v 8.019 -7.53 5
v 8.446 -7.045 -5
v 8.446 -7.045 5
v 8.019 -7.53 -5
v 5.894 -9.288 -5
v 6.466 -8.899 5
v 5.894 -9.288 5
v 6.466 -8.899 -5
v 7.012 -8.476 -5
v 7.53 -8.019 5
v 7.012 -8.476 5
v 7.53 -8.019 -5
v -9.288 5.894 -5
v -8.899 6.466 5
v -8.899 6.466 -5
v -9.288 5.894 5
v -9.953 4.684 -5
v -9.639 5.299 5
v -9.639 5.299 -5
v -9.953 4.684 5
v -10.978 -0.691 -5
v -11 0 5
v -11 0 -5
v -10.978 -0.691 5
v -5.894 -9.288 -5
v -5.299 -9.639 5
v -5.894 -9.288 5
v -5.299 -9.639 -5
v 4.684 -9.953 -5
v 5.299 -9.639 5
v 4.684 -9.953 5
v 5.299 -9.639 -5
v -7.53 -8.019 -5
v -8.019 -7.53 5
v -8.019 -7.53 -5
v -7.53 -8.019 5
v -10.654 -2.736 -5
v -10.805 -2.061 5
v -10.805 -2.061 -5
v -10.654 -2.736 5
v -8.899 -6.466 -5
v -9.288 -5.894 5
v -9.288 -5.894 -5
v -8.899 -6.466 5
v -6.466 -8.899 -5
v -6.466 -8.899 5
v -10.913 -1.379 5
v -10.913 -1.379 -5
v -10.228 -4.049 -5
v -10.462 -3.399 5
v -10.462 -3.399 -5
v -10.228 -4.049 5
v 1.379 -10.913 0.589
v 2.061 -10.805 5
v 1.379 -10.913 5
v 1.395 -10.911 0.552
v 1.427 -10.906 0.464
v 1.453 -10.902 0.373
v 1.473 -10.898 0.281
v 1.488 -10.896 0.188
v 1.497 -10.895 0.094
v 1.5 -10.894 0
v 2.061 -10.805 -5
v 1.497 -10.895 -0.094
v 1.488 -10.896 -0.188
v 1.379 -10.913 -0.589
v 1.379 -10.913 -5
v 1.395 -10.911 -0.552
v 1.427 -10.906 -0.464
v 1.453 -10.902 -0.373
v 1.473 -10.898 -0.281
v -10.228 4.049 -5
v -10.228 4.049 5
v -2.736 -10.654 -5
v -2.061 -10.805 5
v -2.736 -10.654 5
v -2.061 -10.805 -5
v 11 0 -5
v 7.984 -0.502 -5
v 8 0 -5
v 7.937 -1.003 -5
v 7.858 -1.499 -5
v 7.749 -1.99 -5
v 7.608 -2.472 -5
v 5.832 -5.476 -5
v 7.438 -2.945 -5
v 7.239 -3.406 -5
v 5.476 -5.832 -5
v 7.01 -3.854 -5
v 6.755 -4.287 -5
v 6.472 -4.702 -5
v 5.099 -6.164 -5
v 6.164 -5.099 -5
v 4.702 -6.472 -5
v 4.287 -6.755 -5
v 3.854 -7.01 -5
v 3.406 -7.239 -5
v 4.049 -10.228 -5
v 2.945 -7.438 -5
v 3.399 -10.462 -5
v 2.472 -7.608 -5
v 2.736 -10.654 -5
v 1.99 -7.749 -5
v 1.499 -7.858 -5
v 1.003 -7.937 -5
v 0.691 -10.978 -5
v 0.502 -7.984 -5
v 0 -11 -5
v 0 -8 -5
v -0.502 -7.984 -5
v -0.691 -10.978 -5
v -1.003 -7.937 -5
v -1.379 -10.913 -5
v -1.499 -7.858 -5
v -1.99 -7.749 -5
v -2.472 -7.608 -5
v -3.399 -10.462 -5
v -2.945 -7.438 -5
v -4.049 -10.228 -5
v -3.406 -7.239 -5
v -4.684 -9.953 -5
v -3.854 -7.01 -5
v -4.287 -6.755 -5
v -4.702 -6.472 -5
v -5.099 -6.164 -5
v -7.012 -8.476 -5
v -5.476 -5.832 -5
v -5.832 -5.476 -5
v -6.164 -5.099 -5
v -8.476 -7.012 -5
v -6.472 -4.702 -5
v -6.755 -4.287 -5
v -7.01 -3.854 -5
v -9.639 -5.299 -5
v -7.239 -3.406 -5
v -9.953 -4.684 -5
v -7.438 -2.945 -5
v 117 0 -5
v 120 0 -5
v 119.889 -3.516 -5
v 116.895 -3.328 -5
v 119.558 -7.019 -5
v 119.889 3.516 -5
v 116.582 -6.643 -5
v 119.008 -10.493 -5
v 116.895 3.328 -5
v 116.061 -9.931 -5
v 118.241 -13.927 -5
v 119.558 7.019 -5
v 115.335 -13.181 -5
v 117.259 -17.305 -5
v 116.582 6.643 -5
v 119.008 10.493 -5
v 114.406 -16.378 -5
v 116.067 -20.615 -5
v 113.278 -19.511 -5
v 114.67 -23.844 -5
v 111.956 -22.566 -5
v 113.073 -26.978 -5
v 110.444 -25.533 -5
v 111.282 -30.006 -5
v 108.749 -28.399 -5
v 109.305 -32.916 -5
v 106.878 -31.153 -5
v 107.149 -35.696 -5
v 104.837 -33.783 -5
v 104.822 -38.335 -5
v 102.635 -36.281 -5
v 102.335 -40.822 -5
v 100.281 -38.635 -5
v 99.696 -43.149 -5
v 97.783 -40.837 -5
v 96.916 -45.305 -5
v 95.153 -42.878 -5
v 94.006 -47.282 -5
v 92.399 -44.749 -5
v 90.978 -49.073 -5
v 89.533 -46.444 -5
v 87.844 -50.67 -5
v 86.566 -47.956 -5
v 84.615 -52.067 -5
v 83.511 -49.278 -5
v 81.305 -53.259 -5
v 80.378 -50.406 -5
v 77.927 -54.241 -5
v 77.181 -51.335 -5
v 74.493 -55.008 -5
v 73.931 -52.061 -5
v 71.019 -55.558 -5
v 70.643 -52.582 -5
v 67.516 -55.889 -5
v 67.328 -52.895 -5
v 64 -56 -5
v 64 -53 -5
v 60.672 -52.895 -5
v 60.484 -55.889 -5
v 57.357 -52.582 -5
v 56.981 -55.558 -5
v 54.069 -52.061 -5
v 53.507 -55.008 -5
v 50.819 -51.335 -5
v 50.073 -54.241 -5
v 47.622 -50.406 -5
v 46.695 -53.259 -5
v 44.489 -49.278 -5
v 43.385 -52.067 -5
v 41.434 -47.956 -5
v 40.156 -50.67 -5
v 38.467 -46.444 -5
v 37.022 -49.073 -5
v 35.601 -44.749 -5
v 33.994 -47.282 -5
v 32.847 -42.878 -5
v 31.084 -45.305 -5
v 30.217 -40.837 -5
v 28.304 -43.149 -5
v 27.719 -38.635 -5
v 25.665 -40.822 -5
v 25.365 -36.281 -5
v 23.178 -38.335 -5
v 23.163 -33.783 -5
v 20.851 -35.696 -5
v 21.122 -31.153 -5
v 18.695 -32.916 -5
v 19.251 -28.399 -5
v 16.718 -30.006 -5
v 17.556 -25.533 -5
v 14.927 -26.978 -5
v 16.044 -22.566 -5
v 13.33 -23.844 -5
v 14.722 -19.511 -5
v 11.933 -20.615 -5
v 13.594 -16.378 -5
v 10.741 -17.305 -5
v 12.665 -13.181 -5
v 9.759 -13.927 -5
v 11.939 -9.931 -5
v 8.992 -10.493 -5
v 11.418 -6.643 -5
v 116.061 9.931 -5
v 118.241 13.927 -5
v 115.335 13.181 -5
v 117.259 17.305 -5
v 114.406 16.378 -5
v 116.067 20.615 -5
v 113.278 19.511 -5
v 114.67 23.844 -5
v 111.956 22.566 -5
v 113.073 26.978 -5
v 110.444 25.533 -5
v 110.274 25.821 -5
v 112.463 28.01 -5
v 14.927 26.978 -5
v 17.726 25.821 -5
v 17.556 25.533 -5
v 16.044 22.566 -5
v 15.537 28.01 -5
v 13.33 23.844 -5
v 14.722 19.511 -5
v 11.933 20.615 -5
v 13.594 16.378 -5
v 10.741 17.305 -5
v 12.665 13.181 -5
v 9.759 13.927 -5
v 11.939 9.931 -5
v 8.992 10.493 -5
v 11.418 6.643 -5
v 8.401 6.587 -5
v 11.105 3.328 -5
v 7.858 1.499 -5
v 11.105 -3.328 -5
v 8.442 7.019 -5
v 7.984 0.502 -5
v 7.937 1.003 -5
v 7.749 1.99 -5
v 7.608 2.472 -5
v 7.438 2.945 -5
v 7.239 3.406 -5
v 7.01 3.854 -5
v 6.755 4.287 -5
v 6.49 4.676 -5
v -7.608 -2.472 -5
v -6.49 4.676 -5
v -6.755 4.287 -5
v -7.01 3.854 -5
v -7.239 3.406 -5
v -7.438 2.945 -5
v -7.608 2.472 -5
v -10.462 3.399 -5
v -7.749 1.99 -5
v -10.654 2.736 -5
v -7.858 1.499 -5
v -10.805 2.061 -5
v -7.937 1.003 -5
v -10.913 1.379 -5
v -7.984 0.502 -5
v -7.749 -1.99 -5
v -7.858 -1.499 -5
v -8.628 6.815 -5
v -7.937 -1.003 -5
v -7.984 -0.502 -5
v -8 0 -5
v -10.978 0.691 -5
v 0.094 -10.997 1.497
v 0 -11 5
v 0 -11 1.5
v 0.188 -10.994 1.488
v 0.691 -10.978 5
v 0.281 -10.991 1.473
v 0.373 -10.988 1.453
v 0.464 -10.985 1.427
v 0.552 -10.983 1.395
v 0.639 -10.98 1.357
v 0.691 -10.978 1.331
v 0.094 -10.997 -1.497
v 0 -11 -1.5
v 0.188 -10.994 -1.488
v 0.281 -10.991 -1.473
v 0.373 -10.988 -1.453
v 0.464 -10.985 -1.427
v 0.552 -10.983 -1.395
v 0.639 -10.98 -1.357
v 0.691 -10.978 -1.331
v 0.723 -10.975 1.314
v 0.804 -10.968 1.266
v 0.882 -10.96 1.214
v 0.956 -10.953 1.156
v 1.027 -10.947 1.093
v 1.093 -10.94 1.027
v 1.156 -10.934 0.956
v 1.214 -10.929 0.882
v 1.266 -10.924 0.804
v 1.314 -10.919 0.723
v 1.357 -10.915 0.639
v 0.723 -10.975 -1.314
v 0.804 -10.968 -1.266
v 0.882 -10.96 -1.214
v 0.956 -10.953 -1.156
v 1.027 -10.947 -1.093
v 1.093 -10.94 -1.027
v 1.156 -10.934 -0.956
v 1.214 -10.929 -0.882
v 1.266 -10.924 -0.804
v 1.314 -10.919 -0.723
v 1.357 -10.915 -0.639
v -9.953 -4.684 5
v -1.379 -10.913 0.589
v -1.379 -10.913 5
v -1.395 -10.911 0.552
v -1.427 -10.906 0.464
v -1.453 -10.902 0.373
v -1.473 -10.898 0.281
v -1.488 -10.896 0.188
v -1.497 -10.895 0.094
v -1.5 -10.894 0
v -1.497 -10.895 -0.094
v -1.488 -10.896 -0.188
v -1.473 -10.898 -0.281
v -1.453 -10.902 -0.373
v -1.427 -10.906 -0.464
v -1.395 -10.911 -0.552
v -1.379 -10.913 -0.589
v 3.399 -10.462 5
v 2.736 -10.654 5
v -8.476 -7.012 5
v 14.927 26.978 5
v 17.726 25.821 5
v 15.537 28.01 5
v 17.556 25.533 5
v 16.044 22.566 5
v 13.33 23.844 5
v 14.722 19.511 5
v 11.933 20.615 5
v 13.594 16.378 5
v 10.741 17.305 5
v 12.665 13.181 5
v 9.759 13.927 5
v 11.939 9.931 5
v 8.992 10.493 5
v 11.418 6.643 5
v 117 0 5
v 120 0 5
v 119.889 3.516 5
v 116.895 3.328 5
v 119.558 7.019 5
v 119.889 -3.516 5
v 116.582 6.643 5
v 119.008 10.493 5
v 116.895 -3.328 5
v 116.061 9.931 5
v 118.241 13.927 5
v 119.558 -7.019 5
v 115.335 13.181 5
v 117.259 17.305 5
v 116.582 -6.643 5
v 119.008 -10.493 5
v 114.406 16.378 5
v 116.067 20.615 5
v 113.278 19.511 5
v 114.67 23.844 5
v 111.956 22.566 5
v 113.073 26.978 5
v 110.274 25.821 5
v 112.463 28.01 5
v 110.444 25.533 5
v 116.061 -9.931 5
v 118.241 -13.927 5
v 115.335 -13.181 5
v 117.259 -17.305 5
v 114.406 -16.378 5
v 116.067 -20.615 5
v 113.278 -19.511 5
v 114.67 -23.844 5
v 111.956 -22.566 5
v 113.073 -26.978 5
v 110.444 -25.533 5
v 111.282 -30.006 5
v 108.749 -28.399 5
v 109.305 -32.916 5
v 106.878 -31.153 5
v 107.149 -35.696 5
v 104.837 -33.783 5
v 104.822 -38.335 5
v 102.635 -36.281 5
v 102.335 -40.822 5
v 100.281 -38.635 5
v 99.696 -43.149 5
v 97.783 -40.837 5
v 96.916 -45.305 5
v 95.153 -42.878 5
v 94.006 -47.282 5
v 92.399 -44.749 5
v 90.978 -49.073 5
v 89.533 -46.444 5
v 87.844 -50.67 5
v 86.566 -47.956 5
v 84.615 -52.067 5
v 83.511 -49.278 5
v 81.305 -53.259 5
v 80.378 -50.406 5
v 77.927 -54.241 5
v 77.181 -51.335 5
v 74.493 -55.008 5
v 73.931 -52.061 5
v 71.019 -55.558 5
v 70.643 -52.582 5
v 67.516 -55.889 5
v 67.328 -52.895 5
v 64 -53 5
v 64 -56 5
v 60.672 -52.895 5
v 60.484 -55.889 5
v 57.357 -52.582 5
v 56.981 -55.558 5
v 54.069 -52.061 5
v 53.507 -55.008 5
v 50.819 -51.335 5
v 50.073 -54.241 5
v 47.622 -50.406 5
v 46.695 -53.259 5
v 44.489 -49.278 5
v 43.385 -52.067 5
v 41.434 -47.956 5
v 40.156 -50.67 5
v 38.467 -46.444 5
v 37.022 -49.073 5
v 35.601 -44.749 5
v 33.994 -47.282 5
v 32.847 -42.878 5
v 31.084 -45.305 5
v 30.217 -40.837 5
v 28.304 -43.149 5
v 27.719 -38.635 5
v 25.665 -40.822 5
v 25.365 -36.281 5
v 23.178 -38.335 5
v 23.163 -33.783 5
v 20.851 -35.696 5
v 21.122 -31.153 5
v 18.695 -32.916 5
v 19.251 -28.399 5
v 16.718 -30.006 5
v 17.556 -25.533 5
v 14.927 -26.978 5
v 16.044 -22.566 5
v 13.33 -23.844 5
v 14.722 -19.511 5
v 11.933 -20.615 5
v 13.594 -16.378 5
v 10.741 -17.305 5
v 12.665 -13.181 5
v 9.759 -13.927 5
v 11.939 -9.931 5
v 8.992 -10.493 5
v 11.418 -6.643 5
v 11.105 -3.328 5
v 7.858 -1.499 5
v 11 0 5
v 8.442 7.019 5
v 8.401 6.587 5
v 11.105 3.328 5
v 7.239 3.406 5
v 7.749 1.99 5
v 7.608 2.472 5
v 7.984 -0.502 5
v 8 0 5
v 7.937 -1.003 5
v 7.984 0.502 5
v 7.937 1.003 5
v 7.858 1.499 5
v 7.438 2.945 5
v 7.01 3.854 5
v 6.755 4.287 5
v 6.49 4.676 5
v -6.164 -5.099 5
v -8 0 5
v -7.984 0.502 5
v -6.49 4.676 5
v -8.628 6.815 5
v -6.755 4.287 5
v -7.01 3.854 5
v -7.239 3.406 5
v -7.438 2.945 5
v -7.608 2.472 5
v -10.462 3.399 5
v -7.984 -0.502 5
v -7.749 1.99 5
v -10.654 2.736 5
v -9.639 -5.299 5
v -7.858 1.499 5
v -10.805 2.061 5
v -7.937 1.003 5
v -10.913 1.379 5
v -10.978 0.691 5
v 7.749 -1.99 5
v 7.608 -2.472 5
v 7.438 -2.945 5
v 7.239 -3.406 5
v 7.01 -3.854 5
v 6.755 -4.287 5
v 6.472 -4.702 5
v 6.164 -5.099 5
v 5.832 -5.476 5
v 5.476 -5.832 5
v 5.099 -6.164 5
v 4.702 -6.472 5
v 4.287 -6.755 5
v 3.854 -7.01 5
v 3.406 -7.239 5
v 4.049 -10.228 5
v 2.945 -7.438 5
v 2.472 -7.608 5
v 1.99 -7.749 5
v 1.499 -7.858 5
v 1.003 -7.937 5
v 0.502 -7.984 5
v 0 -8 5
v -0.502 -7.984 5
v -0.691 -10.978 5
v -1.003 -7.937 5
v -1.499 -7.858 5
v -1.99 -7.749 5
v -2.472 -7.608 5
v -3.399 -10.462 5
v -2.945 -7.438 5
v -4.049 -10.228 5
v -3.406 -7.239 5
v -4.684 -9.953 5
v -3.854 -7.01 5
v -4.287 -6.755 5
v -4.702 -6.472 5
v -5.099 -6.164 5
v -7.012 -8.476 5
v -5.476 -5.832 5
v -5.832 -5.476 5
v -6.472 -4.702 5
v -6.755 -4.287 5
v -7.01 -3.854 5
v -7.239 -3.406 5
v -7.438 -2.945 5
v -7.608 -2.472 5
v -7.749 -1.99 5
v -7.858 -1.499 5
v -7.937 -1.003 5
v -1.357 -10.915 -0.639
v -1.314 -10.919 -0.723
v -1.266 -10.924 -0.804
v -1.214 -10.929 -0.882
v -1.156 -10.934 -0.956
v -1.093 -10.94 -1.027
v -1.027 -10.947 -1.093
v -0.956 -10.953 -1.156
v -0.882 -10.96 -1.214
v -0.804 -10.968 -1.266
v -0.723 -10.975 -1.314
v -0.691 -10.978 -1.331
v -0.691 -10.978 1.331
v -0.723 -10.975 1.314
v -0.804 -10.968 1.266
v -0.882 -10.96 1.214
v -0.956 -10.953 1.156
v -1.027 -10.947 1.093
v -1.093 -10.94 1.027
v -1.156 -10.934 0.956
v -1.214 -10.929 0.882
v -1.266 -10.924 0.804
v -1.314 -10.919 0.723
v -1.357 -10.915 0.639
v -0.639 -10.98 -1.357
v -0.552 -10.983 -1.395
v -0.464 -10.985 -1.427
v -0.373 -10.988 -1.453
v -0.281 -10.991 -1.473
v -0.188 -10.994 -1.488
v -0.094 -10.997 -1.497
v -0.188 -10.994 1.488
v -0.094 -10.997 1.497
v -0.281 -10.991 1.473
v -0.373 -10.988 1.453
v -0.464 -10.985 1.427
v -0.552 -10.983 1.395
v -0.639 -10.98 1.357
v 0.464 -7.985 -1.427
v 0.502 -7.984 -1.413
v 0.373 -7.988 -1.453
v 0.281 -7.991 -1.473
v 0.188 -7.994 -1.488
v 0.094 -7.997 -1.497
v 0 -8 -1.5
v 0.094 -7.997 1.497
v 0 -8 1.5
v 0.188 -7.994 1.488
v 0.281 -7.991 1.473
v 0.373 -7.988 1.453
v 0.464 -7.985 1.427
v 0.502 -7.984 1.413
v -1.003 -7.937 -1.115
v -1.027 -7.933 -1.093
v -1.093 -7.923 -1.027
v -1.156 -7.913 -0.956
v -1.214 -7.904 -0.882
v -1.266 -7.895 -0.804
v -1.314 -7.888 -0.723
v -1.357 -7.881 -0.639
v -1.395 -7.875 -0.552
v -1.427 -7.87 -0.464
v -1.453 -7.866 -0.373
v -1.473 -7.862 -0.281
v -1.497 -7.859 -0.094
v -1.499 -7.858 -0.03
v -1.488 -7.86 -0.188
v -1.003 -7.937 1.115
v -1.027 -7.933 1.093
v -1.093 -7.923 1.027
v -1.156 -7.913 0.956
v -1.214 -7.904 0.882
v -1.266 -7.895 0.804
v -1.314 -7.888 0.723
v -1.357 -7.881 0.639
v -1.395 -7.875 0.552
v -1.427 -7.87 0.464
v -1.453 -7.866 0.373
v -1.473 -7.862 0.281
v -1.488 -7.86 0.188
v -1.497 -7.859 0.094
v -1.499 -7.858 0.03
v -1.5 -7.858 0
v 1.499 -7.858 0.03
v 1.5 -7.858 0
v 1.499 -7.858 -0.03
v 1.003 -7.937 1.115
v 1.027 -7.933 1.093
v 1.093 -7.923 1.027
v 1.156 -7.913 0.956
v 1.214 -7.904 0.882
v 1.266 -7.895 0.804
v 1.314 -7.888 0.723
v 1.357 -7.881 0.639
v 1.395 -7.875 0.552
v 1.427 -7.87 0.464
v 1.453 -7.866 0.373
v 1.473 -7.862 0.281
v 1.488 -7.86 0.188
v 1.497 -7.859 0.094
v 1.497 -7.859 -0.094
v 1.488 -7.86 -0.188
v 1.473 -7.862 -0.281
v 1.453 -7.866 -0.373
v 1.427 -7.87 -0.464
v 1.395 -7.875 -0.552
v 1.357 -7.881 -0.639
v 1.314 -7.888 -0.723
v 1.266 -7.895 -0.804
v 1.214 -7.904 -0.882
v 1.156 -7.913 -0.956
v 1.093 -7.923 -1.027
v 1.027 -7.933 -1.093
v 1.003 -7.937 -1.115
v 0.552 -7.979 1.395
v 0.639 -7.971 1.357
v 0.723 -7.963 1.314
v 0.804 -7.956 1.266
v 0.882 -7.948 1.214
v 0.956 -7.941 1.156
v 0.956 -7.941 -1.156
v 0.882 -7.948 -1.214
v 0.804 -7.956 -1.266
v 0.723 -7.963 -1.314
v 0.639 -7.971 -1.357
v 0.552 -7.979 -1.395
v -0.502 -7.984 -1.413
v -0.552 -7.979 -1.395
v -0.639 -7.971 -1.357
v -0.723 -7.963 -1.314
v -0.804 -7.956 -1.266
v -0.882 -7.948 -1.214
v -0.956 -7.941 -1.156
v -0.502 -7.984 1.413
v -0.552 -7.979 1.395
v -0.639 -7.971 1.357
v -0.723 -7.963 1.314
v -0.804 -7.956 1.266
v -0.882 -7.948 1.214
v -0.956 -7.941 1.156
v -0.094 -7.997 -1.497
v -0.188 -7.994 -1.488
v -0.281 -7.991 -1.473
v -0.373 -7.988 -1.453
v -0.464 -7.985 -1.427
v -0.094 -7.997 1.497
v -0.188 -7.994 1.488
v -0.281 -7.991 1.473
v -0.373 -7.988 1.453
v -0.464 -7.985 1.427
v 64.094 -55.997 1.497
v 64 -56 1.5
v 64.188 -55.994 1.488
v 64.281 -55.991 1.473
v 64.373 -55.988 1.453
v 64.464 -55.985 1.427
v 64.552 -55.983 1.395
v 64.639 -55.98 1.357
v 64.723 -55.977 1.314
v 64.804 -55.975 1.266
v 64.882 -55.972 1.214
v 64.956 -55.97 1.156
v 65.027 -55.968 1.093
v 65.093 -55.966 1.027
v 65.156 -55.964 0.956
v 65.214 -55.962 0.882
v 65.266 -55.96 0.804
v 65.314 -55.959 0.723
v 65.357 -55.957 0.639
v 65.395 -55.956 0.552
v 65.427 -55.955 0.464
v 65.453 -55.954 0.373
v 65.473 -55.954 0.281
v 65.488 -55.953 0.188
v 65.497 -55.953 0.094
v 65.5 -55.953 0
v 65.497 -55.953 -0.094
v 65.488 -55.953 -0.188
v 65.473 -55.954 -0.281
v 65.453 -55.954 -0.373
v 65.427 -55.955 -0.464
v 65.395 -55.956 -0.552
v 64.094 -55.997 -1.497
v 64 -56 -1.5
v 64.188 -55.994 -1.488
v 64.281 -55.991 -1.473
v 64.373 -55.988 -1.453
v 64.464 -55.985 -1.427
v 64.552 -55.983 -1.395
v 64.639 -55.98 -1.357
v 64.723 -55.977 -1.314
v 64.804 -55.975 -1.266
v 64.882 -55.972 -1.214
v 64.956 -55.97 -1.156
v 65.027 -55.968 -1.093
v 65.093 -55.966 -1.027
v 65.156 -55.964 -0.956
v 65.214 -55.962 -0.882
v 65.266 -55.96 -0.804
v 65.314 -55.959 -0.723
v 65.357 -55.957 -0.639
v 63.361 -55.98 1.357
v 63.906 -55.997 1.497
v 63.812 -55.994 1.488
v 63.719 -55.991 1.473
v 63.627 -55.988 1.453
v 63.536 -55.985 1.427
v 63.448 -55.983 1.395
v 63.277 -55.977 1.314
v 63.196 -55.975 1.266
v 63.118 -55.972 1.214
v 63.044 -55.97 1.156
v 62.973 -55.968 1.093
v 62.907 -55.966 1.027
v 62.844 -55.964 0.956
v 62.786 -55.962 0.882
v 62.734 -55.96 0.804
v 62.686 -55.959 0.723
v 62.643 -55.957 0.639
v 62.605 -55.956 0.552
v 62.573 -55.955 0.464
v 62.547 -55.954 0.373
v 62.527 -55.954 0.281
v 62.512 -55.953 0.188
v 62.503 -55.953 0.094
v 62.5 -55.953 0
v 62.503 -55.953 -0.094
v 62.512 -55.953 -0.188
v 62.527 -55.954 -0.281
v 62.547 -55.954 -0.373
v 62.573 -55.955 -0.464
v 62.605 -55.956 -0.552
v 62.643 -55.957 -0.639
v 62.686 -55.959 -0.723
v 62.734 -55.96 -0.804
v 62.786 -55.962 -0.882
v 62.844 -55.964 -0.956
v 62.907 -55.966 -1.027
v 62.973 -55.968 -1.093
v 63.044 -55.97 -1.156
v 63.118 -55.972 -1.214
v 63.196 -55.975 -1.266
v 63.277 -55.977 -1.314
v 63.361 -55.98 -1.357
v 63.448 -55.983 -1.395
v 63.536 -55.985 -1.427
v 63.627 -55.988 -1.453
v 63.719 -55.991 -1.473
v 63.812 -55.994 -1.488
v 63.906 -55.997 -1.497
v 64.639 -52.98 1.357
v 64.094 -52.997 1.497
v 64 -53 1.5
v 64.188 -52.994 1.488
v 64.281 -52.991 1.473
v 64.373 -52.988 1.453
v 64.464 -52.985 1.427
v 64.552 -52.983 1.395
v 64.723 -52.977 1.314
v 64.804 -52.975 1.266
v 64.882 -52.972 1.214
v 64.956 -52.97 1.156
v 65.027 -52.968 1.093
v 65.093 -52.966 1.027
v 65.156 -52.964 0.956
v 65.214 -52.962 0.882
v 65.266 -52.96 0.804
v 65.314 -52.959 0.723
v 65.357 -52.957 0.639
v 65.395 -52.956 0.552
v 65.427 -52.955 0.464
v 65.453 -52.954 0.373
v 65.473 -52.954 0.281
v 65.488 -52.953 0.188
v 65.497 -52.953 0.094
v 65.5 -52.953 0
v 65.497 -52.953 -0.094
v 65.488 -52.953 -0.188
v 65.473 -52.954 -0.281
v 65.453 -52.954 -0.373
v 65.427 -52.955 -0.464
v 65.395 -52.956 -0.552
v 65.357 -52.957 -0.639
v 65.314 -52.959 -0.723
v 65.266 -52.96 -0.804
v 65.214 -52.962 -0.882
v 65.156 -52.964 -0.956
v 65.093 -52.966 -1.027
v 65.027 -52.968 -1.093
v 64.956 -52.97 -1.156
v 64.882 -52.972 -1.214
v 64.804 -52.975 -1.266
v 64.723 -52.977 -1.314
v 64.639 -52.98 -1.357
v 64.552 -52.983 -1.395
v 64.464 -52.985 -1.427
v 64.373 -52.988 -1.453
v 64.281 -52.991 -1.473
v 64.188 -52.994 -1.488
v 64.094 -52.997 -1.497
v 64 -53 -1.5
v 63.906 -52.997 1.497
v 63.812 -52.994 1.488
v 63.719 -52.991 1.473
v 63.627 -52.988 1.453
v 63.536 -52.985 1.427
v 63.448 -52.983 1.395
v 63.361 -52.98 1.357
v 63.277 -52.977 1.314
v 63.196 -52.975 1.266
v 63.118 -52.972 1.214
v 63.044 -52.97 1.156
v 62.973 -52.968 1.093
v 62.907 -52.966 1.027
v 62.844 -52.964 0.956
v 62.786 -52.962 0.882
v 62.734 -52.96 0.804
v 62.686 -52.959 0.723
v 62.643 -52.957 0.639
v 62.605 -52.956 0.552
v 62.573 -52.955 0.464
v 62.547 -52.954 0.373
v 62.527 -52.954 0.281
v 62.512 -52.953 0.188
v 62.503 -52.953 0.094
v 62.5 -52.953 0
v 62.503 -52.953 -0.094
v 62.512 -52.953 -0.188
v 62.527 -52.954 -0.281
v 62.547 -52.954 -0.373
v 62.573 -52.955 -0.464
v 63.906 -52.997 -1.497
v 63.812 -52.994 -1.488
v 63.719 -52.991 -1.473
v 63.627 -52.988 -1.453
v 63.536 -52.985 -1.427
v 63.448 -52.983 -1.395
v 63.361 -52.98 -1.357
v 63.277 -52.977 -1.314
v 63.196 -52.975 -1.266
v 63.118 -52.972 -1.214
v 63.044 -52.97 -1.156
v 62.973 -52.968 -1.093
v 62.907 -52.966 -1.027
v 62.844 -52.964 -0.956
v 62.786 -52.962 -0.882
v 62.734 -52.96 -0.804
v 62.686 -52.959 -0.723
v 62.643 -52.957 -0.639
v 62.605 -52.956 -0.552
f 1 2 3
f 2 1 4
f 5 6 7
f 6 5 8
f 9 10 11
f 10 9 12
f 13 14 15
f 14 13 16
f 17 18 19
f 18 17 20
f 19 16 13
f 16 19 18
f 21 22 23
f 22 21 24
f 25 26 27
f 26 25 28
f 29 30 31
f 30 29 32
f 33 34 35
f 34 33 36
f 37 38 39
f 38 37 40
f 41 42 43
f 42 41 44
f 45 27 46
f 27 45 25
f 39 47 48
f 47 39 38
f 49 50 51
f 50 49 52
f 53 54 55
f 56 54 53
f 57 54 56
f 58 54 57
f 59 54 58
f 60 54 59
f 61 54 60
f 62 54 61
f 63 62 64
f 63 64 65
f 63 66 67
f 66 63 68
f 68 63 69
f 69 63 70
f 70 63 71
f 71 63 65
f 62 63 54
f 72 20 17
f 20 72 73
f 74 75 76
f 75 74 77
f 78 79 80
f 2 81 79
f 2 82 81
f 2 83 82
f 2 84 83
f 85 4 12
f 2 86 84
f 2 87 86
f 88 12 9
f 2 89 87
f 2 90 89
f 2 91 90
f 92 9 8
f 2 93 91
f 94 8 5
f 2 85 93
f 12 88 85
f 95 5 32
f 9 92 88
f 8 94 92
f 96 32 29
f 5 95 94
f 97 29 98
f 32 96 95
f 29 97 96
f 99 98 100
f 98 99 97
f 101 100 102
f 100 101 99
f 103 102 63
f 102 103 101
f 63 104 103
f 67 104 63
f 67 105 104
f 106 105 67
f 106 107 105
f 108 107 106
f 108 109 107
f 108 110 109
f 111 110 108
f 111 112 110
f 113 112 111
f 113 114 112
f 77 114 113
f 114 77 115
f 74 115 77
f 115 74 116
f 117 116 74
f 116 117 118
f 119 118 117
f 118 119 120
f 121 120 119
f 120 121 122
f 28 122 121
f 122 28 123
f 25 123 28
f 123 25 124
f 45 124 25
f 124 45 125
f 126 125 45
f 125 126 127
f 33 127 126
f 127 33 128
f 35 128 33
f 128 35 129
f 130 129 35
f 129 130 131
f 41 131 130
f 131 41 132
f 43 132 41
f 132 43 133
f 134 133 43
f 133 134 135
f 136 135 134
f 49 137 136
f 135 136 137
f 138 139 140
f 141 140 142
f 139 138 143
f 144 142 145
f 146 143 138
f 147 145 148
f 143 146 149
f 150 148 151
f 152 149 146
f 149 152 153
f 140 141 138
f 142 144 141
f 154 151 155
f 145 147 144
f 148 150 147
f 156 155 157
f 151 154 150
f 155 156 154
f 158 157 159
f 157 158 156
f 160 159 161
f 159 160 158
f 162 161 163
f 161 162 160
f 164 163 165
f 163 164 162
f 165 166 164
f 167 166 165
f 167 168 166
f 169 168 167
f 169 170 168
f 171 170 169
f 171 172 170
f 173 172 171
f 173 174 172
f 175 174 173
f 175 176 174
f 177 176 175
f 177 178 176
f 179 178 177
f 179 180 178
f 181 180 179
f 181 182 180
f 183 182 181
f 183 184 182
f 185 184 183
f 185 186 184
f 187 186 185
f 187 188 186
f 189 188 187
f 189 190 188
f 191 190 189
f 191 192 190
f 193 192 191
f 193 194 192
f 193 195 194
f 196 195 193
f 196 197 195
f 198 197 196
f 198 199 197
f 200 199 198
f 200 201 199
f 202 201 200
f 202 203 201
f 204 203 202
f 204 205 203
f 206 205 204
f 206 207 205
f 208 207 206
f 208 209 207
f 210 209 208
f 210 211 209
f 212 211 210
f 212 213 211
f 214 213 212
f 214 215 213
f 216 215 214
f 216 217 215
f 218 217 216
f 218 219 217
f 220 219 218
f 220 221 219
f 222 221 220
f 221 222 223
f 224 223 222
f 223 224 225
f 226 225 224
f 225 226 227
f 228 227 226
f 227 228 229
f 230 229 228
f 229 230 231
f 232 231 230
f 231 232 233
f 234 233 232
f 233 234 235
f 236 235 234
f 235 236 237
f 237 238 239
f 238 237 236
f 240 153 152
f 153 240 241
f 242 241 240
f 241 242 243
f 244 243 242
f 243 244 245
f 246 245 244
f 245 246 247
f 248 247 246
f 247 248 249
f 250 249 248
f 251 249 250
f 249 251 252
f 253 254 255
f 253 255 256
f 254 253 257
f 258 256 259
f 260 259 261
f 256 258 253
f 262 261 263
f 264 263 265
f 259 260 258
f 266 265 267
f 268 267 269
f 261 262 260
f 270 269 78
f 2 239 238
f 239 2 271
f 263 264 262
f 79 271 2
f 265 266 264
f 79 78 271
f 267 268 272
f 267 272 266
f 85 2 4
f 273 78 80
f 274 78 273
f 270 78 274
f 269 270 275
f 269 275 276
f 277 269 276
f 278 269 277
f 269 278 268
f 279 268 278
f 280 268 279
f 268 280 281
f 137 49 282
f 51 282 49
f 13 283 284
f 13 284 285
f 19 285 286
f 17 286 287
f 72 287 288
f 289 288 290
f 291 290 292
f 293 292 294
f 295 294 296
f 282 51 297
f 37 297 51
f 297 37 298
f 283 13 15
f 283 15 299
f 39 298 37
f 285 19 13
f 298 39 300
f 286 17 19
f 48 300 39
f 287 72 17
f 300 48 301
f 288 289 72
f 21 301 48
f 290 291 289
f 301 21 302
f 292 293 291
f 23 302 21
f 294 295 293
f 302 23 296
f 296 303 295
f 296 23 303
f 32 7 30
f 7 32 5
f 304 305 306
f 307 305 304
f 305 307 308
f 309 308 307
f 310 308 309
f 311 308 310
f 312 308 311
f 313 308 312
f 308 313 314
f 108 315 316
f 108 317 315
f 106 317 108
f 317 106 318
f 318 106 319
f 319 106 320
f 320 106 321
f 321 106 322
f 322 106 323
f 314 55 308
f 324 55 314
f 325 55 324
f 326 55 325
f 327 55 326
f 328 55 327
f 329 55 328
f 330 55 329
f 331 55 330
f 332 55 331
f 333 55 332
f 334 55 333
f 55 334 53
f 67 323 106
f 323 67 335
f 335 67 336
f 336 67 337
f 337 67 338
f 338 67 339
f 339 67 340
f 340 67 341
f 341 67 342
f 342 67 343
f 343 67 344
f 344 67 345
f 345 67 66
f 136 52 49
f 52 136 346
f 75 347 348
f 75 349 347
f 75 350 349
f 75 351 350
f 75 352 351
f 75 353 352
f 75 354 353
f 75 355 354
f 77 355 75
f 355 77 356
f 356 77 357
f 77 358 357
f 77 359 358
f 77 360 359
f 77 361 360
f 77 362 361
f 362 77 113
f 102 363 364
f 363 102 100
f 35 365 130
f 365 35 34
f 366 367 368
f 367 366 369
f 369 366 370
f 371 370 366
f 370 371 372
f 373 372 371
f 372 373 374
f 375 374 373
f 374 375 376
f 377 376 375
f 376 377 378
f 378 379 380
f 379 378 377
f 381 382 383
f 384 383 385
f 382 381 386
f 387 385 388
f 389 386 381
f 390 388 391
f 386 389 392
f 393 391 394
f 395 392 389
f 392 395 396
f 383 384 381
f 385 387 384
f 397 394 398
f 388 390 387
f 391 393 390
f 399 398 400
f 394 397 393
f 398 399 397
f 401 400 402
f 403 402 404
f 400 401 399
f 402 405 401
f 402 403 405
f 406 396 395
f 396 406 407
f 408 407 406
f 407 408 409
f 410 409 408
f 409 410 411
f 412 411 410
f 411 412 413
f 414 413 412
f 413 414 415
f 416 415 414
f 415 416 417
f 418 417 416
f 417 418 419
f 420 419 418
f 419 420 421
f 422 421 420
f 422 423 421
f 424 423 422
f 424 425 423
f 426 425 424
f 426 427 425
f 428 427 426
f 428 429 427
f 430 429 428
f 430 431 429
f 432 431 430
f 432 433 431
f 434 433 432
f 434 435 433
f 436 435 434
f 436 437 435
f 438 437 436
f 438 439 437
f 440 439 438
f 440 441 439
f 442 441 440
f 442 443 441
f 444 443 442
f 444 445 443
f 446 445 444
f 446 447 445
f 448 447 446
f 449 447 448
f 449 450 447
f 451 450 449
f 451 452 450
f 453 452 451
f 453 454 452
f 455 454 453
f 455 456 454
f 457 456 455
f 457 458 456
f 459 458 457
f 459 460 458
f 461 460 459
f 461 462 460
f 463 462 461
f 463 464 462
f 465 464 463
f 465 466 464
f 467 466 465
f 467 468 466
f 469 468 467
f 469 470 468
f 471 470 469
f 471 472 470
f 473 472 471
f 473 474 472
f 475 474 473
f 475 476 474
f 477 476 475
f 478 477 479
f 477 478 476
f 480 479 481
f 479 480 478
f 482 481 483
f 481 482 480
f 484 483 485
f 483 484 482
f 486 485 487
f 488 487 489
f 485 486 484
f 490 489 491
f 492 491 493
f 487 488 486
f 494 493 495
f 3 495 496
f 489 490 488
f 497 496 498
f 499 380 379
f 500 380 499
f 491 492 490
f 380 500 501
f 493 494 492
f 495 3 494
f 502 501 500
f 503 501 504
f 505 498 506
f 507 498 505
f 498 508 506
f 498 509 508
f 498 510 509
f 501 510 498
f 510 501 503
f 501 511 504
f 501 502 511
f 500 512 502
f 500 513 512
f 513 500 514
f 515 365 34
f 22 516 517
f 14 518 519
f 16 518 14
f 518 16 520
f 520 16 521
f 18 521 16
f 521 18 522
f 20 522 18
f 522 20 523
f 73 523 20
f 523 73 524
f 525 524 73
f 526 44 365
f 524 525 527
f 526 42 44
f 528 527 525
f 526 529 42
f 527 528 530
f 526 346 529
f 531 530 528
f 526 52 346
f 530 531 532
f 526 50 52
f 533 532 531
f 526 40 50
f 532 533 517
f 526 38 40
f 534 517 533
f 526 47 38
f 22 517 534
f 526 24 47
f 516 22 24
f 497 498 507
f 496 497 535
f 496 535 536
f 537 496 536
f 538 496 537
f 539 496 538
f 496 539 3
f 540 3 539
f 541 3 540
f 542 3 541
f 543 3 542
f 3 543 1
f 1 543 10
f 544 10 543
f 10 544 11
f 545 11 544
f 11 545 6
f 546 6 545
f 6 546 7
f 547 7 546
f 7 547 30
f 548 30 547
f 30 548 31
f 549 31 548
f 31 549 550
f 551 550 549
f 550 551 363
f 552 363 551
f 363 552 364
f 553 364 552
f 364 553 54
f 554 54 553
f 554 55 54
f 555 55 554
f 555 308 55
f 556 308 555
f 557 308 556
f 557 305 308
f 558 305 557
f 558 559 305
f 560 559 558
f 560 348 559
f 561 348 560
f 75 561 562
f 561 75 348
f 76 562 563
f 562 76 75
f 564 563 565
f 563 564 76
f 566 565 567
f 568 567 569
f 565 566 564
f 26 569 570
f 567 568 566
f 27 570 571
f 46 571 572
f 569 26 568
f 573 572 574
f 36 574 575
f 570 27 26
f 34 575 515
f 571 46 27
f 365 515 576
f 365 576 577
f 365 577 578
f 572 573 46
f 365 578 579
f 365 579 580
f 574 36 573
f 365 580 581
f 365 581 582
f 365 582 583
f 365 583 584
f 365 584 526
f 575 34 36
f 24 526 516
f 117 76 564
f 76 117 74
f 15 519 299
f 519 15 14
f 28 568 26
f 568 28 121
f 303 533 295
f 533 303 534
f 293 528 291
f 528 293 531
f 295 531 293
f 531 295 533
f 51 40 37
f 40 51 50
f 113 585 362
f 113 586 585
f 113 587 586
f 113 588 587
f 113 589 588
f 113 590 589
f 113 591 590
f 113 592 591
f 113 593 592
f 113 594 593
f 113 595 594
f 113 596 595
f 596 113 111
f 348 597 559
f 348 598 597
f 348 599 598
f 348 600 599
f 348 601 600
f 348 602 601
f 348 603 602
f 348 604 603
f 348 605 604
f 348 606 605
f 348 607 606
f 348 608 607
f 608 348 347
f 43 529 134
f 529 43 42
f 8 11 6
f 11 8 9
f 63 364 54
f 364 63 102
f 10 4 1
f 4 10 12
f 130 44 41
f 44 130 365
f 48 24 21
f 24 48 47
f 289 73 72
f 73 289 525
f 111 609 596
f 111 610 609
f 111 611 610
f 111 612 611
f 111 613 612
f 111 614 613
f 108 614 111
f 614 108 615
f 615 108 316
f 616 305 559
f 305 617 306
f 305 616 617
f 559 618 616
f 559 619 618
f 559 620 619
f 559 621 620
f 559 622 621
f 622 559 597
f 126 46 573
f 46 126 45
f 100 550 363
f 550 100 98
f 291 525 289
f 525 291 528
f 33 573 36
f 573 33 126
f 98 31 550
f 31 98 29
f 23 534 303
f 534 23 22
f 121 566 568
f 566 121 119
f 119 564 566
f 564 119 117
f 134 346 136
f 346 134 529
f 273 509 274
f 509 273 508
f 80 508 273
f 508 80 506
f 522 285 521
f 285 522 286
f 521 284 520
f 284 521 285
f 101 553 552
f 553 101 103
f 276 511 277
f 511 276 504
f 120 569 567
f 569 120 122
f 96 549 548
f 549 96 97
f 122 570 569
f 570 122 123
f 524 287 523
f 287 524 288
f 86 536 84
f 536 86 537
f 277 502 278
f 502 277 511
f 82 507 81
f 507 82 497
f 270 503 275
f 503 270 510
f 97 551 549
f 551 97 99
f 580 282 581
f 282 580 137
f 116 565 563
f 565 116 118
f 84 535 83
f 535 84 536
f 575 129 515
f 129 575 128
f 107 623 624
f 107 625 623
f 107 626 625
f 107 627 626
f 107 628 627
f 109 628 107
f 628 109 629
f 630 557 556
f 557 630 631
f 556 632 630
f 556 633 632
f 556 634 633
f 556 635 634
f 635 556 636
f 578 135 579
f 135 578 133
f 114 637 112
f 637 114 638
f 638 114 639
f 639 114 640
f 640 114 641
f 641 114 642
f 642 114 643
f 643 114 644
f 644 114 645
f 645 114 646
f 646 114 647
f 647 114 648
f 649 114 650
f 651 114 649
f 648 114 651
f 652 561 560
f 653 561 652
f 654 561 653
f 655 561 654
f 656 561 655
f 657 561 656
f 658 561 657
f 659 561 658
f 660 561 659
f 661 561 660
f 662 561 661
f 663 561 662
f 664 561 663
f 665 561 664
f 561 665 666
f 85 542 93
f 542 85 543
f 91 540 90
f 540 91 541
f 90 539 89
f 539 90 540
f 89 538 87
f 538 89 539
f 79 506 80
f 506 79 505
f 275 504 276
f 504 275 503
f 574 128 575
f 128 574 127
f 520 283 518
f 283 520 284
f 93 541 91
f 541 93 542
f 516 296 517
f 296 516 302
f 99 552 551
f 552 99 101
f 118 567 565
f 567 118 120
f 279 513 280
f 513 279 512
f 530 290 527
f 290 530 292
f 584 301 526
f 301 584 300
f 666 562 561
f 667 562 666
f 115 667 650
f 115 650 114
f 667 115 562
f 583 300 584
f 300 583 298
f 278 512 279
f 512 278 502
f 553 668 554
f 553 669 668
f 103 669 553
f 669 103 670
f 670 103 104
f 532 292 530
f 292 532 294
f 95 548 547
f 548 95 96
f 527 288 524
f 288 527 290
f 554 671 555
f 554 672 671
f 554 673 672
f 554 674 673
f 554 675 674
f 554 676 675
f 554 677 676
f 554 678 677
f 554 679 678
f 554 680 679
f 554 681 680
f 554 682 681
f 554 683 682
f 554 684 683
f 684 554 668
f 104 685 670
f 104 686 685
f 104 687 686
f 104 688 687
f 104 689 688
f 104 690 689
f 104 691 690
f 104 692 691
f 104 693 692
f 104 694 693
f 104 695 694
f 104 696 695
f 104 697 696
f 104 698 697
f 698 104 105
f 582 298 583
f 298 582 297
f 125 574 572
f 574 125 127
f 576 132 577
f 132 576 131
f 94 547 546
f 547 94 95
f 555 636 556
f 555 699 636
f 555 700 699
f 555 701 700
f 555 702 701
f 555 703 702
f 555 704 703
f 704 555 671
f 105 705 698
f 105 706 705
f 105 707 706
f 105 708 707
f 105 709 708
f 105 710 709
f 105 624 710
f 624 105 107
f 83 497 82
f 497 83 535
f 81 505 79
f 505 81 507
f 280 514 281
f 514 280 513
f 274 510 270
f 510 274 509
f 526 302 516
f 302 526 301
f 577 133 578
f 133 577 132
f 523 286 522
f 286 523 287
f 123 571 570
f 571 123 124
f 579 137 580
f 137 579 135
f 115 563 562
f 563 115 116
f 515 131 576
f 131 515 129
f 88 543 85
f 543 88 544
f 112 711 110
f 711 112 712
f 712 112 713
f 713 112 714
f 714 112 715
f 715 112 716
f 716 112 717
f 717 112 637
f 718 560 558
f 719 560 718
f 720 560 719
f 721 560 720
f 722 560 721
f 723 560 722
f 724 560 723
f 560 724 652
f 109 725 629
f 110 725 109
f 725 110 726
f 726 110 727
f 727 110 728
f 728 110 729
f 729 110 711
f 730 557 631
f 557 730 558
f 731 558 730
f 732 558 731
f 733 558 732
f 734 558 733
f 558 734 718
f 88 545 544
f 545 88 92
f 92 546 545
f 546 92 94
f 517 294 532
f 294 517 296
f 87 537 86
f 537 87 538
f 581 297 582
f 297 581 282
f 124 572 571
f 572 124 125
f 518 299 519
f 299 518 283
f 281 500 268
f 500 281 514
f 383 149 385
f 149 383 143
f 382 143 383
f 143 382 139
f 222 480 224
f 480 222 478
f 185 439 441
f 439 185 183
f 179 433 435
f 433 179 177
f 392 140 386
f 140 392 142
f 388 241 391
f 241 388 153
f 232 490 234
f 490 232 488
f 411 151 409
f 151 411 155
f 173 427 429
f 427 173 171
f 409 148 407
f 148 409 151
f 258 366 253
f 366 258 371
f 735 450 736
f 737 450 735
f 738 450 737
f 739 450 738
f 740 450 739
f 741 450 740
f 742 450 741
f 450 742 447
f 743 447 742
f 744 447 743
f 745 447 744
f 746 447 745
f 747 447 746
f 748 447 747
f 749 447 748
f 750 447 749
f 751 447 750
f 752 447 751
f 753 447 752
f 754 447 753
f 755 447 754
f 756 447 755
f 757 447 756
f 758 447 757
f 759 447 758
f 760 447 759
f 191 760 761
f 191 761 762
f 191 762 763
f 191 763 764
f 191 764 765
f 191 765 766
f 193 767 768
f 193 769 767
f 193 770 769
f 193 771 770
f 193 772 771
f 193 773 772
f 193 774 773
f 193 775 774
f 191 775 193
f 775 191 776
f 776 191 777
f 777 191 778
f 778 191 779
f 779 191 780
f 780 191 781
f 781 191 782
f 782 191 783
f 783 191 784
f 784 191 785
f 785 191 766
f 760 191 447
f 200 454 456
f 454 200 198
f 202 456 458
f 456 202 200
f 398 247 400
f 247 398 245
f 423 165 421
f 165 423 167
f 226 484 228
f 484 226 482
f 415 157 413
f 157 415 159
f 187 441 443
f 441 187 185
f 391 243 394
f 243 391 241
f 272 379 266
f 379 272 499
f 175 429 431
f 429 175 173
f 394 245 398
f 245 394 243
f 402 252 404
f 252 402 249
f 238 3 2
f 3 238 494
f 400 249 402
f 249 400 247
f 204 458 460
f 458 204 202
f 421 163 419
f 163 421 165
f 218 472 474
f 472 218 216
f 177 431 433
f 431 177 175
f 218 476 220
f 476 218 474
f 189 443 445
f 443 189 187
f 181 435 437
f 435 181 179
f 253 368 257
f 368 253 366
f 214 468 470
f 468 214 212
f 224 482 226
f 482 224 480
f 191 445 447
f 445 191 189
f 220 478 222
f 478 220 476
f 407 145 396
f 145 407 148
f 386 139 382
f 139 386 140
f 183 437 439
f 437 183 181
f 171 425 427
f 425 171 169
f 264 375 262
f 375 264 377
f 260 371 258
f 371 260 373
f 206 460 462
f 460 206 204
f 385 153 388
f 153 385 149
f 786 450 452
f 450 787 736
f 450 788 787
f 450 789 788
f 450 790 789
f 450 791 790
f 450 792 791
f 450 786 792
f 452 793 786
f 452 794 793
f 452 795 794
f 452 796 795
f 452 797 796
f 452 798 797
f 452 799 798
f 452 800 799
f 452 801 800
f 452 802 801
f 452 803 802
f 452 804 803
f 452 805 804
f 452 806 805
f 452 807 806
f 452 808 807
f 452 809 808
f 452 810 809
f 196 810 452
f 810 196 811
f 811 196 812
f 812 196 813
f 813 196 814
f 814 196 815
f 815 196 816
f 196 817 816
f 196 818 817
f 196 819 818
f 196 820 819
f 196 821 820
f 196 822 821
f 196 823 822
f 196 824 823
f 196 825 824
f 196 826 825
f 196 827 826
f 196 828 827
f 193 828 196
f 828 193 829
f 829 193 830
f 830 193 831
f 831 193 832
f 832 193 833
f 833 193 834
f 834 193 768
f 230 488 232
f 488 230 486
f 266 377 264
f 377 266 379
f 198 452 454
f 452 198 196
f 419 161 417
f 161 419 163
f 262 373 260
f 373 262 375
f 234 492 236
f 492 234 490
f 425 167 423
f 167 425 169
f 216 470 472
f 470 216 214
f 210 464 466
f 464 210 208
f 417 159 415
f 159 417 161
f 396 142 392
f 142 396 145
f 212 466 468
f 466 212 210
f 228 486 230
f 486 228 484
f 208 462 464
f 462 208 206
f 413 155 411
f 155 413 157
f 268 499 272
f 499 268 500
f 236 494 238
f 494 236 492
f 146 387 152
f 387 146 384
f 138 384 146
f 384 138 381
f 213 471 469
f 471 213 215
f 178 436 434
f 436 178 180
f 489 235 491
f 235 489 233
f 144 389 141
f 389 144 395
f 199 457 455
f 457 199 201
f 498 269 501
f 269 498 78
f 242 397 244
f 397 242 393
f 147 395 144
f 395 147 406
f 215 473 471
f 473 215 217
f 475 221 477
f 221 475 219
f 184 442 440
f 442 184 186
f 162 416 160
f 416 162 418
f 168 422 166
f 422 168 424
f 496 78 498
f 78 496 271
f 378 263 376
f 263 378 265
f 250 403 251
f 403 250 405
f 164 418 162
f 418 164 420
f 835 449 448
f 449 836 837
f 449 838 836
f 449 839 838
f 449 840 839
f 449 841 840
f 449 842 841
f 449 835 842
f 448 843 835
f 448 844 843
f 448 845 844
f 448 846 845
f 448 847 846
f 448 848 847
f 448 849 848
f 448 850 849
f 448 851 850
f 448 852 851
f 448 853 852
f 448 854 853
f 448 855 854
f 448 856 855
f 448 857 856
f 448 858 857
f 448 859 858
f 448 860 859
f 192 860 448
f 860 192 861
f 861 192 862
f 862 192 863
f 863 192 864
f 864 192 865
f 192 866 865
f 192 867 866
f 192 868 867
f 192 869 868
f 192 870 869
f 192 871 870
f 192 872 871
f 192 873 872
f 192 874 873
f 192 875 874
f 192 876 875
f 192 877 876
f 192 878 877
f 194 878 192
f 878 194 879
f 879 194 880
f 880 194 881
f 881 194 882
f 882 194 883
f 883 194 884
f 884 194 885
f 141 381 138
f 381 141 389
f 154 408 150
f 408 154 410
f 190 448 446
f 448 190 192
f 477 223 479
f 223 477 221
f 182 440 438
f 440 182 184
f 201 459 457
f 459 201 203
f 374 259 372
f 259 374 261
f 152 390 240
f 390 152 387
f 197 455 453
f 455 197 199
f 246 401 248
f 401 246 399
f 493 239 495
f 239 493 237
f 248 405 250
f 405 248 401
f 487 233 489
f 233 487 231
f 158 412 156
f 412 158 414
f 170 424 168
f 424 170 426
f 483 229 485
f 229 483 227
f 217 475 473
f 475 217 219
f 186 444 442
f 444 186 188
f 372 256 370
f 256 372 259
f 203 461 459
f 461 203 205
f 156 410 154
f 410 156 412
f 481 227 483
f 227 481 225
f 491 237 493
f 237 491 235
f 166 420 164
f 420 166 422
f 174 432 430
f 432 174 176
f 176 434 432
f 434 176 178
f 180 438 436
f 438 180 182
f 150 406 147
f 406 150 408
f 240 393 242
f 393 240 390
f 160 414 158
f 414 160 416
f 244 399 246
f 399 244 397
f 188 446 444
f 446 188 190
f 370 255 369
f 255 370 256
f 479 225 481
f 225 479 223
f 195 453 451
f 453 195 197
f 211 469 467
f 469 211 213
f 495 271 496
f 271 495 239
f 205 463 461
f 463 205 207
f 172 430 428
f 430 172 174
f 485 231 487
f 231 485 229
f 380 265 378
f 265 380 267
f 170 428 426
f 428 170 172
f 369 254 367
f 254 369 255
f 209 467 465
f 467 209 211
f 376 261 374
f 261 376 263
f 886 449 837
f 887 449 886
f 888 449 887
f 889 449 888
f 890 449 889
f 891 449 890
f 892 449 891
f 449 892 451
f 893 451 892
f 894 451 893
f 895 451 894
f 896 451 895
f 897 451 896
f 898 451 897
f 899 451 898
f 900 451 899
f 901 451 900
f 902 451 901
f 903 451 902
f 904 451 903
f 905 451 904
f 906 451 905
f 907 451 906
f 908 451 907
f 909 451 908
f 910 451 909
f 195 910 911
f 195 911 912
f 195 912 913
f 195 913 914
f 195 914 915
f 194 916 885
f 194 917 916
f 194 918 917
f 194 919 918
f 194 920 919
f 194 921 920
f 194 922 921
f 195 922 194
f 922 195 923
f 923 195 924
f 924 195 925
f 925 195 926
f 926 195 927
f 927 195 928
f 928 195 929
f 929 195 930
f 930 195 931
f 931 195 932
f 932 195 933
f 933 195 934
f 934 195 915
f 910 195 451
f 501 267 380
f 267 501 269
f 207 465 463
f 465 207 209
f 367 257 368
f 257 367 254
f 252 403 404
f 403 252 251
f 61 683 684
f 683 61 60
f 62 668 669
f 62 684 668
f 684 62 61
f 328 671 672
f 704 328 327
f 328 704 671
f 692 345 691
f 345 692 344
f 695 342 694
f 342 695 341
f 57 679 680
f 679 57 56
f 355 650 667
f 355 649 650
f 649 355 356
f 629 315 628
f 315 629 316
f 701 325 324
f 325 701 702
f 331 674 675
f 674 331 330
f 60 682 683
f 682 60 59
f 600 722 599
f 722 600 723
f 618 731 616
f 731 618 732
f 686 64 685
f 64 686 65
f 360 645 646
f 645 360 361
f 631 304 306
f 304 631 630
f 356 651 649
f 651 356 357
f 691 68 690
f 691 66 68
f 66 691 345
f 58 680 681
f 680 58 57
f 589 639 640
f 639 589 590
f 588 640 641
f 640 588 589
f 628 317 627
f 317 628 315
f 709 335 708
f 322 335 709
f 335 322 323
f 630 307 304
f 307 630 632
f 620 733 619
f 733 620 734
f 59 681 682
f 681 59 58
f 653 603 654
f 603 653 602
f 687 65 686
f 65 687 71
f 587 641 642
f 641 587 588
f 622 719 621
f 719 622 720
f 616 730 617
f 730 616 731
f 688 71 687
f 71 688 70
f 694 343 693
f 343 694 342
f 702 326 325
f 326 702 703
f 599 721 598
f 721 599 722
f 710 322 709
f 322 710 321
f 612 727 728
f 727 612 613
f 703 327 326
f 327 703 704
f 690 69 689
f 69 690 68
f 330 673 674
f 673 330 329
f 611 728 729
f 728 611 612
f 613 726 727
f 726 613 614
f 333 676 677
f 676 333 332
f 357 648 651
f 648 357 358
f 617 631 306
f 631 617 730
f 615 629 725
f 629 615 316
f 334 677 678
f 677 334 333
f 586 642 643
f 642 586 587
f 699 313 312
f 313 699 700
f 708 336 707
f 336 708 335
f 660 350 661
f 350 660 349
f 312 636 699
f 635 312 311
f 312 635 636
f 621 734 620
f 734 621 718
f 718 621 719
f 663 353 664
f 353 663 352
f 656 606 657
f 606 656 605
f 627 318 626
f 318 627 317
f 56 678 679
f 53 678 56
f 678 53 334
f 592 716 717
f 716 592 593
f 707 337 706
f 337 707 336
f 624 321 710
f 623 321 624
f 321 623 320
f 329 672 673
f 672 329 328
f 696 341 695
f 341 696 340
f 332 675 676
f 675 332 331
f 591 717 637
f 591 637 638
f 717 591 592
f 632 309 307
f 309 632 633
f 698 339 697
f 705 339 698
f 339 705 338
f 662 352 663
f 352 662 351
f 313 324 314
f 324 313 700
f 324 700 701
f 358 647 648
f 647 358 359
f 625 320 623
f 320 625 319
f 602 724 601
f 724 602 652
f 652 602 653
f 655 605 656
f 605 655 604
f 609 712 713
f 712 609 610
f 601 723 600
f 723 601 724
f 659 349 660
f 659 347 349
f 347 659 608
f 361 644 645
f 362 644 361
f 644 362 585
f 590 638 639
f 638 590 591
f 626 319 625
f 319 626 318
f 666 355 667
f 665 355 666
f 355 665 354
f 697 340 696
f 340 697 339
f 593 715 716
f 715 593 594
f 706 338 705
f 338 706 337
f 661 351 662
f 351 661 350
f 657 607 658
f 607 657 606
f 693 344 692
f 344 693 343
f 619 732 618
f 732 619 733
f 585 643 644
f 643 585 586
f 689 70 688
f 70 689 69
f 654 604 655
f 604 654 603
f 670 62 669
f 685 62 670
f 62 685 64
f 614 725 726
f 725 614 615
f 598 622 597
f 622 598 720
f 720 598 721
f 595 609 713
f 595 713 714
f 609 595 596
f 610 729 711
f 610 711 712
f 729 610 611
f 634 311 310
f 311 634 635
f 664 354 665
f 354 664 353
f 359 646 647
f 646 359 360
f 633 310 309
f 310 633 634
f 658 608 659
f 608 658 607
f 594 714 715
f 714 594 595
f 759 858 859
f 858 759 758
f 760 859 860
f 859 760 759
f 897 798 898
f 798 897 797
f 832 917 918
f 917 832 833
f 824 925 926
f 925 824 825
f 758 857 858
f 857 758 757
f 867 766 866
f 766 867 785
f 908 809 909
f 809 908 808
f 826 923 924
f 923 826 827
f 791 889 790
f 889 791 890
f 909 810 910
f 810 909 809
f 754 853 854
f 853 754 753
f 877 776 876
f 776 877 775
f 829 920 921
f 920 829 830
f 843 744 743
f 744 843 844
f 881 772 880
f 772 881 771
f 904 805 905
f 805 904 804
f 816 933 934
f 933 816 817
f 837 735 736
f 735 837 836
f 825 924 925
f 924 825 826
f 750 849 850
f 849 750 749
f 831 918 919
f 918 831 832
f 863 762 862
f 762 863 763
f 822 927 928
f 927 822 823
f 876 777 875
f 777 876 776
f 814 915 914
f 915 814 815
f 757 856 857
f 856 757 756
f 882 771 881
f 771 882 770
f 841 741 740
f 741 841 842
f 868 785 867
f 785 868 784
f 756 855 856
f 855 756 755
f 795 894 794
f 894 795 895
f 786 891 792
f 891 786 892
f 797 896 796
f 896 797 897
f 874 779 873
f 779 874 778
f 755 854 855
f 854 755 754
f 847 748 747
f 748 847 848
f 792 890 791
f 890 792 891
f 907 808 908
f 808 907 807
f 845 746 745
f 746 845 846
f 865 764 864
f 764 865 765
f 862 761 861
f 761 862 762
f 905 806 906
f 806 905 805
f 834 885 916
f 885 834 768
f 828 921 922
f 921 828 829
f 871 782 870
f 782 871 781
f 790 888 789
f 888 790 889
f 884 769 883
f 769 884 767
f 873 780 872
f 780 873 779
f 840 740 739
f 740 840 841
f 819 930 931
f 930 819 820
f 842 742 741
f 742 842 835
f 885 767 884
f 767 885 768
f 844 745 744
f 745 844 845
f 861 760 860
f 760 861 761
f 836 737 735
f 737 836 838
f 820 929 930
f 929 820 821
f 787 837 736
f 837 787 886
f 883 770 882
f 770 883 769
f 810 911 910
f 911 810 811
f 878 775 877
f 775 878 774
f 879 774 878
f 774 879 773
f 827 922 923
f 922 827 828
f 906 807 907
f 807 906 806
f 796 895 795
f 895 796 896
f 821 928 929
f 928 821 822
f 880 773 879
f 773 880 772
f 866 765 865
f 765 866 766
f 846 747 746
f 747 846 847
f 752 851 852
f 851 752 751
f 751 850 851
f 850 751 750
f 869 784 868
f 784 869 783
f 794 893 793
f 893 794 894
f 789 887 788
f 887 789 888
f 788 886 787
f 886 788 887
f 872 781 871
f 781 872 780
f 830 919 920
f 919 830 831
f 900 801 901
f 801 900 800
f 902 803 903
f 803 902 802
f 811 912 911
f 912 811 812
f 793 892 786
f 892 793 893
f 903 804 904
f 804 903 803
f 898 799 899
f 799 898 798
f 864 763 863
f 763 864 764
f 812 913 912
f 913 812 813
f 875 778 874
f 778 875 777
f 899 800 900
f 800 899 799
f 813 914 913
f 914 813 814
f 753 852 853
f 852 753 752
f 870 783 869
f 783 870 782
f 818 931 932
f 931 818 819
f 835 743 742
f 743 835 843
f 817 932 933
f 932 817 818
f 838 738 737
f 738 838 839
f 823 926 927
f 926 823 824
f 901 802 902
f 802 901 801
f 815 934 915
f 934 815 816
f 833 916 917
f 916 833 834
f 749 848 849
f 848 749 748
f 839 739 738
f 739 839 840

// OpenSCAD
//+------------------------------+
//|OPENSCAD double pipe clamp V2 |
//|      2016 gaziel@gmail.com   |
//|    beerware licence          |
//+------------------------------+  

//first pipe diametre
d1=16; 
//seconde pipe diametre
d2=106; 
//thinkness
ep=3; 
//hight
h=10; 
//if need support
pylone="no"; //[yes,no]
//need hole ?
hole="yes"; //[yes,no]
//hole diametre
dh=3;

$fn=200/2;

difference(){
    union(){
        //creaton des support de tuyaux
        clamp(min(d1,d2));
        translate([((d1+d2)/2)+ep,0,0])clamp(max(d1,d2));
        //creation du module d'accroce a plat
        if (pylone=="yes"){
            pylone(d1,d2);
            translate([(d1+d2)/4,-max(d1/2,d2/2)-ep/2,0])cube([((d1+d2)/2)+(2*ep),ep,h],center=true);
        }
    }       
    //creation des trous 
    if (hole=="yes"){
        rotate([90,0,0])cylinder(d=dh,h=max(d1,d2)*6,center=true);
        translate([((d1+d2)/2)+ep,0,0])rotate([90,0,0])cylinder(d=dh,h=max(d1,d2)*6,center=true);
    }
}

module pylone(dc1,dc2){
    hull(){    
        translate([0,-(min(dc1,dc2)/2)-(ep/2),0]) cube([h,ep,h], center=true);
        translate([0,-(max(dc1,dc2)/2)-ep/2,0]) cube([h+(2*ep),ep,h], center=true);
    }
}

module clamp(dc){
    difference(){
        cylinder(d=dc+ep*2,h=h,center=true);
        cylinder(d=dc,h=h,center=true);
        translate([0,(dc+ep)/2,0])rotate([0,0,45])cube([dc,dc,h],center=true);
    }
}
